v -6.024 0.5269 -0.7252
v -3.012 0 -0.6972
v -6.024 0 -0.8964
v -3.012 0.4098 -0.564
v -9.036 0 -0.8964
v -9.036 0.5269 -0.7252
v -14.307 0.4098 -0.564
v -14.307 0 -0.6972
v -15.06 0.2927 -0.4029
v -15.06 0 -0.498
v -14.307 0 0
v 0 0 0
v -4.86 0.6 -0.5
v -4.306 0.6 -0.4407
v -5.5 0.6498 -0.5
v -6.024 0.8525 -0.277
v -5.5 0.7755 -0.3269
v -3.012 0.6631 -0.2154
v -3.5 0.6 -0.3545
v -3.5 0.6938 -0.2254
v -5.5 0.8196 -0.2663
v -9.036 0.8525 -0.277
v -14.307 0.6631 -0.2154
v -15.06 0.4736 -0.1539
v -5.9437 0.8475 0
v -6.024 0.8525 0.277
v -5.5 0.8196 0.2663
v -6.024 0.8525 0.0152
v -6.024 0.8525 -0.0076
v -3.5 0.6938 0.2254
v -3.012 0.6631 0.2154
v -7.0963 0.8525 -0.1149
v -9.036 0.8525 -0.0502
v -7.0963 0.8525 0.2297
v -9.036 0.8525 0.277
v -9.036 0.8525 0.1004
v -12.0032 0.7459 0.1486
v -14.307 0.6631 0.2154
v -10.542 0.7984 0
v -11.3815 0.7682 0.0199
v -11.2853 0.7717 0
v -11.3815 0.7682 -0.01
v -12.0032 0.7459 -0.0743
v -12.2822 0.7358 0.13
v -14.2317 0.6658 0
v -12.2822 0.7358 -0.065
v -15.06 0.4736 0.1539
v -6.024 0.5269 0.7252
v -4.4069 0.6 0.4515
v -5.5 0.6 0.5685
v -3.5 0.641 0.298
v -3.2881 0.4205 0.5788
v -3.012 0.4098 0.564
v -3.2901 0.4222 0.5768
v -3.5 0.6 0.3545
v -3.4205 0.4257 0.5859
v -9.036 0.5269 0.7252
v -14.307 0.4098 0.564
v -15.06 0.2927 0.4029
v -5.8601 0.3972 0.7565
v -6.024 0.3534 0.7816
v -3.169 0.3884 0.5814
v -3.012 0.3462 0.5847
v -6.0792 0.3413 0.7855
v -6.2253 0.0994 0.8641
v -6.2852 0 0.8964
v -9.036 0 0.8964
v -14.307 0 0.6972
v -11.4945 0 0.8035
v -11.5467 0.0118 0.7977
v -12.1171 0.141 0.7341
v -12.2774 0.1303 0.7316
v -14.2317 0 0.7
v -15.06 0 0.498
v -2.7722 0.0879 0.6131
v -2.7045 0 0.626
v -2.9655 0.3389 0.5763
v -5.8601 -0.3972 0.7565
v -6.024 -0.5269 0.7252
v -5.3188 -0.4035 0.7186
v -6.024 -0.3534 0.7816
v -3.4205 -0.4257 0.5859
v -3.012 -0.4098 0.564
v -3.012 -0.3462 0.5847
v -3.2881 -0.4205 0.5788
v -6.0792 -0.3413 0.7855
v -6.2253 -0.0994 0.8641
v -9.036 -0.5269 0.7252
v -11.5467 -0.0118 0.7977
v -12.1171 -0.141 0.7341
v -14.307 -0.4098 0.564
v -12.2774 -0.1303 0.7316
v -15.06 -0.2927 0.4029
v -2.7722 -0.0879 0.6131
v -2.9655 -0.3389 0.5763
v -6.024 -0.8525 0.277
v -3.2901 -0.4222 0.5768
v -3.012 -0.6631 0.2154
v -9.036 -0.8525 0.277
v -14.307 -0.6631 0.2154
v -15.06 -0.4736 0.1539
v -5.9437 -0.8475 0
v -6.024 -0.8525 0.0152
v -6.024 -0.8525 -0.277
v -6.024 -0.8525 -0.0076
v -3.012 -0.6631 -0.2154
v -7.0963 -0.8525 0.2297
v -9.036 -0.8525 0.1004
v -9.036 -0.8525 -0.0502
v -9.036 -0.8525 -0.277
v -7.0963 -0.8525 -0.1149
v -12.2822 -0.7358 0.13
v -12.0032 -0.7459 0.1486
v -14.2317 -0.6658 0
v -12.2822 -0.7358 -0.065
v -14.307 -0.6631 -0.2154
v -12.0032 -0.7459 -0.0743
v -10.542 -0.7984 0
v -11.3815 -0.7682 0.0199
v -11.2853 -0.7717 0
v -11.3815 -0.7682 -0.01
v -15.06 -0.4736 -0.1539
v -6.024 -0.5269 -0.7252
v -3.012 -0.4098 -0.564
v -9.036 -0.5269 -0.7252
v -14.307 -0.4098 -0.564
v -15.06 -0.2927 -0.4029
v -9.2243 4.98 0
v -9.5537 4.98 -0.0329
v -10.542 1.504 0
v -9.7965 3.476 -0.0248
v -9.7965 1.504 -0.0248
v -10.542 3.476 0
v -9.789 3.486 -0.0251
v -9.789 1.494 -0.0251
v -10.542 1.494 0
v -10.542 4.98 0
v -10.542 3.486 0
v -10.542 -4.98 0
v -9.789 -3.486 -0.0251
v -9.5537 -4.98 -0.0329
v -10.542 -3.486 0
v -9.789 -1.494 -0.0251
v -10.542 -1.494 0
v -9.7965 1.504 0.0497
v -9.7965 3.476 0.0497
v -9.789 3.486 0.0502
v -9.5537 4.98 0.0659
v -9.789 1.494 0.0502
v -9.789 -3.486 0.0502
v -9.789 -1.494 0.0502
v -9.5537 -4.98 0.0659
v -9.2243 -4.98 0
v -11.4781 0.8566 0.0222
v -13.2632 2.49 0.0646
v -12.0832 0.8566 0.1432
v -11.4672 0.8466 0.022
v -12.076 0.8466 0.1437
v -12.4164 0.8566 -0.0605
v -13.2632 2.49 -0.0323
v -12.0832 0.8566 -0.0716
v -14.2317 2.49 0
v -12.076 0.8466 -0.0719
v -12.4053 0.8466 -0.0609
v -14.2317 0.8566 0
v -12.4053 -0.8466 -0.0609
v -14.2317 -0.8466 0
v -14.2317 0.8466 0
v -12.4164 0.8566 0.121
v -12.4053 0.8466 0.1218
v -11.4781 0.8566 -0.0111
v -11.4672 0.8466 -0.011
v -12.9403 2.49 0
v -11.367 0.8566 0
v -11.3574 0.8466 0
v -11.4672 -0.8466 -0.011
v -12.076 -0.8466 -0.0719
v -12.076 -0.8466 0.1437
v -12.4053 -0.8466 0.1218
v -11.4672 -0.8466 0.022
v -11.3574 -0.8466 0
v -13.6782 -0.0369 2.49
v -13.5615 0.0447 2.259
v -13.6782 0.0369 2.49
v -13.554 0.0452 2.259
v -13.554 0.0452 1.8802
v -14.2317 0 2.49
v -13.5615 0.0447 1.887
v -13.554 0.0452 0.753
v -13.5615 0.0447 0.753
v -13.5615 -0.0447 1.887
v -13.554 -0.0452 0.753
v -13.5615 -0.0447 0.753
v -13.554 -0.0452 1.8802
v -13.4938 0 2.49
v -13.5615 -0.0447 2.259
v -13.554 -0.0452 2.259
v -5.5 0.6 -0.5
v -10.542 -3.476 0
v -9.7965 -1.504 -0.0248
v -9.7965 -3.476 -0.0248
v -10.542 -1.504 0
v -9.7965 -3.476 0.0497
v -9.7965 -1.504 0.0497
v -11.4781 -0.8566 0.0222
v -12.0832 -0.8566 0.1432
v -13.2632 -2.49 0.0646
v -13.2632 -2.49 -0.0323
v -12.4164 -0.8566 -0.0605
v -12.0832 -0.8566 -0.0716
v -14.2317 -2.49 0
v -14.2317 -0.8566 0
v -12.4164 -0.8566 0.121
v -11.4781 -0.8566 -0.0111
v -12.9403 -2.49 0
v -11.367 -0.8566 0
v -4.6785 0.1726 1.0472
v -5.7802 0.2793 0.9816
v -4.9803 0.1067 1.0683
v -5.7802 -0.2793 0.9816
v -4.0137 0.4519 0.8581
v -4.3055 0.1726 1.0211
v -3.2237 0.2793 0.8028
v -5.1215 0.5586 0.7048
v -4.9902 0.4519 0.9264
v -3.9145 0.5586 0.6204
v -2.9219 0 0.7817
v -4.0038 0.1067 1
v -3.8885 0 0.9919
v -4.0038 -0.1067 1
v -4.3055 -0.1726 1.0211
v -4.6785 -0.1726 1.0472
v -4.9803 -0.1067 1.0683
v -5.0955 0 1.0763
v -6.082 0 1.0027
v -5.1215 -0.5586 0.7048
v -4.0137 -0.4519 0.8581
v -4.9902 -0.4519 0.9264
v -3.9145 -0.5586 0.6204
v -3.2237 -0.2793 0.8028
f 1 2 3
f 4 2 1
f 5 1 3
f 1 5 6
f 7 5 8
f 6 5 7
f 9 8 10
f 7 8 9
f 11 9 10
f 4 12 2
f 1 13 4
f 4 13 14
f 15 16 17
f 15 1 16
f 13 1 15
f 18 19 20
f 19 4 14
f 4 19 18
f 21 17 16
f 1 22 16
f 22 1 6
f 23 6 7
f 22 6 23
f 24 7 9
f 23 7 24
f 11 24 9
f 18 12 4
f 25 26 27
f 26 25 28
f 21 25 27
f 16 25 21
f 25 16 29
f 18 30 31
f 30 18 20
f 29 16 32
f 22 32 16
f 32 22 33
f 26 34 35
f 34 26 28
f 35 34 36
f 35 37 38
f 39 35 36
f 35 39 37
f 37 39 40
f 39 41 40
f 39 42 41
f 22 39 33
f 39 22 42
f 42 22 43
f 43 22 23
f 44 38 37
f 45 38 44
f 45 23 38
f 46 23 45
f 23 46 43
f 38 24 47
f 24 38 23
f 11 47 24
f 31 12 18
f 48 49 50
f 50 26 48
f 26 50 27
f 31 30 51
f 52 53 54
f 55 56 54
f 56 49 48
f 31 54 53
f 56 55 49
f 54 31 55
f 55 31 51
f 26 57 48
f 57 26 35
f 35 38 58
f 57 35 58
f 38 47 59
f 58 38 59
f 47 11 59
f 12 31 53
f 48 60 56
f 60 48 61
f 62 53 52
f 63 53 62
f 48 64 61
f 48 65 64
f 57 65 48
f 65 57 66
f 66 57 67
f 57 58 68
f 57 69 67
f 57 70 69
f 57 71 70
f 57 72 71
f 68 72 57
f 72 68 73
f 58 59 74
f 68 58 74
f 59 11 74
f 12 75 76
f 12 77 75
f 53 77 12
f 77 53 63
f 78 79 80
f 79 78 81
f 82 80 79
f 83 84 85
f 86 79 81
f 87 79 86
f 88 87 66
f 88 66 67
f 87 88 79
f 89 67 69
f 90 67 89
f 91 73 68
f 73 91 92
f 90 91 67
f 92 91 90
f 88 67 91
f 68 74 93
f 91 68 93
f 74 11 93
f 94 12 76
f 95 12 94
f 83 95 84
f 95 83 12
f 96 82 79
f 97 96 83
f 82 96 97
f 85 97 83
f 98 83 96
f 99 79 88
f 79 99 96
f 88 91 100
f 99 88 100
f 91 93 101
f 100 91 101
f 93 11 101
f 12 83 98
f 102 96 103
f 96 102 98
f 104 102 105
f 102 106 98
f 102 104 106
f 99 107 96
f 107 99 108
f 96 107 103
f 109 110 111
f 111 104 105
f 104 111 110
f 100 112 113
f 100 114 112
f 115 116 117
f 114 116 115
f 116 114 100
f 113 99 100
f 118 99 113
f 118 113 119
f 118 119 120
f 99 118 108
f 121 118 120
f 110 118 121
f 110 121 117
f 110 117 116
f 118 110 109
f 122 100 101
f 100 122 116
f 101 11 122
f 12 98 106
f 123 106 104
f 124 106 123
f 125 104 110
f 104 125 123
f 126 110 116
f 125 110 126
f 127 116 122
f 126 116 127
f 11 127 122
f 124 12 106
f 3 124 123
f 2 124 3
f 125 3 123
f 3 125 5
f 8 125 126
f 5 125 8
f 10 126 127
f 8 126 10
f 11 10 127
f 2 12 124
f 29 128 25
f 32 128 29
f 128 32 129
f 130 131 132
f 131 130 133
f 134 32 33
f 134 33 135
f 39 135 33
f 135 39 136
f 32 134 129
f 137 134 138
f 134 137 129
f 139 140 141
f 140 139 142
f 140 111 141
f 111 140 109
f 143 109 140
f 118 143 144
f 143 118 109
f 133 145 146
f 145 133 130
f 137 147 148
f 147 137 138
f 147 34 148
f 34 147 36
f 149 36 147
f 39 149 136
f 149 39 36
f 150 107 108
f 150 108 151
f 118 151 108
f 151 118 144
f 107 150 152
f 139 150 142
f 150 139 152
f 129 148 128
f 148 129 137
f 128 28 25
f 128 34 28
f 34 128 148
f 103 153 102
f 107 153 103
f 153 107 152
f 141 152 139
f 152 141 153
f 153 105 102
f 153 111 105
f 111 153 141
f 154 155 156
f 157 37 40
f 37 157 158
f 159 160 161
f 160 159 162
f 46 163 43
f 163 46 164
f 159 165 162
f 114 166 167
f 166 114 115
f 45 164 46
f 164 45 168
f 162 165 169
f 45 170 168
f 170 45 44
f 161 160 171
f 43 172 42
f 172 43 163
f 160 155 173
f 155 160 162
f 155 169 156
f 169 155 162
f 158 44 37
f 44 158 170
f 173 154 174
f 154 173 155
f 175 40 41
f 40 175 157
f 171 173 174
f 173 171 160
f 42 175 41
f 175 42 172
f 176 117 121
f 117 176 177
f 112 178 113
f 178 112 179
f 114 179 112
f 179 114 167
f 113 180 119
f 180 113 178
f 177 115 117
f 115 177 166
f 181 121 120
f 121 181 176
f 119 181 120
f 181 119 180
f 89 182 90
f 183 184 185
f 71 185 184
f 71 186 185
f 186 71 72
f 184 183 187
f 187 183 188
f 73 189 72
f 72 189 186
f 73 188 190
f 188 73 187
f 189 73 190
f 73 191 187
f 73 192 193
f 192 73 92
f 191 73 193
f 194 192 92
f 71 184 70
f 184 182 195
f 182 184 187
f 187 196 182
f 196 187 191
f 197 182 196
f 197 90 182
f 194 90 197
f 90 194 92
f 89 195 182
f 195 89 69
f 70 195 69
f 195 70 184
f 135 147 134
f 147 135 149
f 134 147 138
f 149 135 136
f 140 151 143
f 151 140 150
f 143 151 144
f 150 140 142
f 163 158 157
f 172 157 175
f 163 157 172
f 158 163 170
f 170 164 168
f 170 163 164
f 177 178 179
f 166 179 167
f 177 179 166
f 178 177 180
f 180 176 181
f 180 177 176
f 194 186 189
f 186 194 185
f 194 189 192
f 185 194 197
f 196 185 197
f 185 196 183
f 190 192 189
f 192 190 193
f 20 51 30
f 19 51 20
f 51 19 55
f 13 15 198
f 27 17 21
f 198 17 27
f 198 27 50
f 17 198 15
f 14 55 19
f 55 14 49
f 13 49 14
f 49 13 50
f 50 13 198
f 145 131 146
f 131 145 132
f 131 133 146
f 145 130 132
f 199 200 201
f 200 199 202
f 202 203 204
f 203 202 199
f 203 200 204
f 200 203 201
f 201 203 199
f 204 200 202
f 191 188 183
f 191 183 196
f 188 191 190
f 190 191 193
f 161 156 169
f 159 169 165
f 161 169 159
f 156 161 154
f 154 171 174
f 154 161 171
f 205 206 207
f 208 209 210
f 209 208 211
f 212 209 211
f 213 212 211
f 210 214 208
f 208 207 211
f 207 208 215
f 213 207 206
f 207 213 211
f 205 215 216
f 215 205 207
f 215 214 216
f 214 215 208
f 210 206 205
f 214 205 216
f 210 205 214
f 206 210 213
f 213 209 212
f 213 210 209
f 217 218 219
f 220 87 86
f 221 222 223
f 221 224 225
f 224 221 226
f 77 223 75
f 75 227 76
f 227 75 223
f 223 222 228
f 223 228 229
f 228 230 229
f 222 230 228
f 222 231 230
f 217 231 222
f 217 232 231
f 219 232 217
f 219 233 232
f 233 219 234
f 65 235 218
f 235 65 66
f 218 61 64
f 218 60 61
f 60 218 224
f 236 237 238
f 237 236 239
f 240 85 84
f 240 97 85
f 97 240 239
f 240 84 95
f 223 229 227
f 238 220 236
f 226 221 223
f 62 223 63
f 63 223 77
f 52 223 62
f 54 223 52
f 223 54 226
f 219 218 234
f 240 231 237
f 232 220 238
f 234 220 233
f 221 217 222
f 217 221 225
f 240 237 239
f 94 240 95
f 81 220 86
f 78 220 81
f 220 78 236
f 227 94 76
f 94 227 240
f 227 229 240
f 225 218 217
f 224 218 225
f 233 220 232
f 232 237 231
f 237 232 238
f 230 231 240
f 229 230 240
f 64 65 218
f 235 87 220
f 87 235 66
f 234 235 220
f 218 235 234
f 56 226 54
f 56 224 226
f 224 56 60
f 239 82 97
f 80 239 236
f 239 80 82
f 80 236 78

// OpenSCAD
$fn=10;
length = 15.06;
wingspan = 9.96;

chord = length*0.35;
taper = 0.25;

tail_span = wingspan*0.5;
tail_chord = chord*0.7;
tail_taper = 0.35;

vert_span = tail_span;
vert_chord = tail_chord;
vert_taper = 0.2;

module wing(chord, wingspan, taper) {
    color([0.6, 0.6, 0.6]) translate([-chord, 0]) rotate([90, 0, 180]) linear_extrude(height=wingspan/2, scale=taper) polygon([
        [0, 0],
        [-chord*0.75, 0.05*chord],
        [-chord, 0],
        [-chord*0.75, -0.025*chord]
    ]);
}

module wing_sym(chord, wingspan, taper) {
    color([0.6, 0.6, 0.6]) translate([-chord, 0]) rotate([90, 0, 180]) linear_extrude(height=wingspan/2, scale=taper) polygon([
        [0, 0],
        [-chord*0.75, 0.05*chord],
        [-chord, 0],
        [-chord*0.75, -0.05*chord]
    ]);
}

module airframe_half() {
    translate([-length*0.35, 0]) wing(chord, wingspan, taper);
    translate([-length*0.7, 0]) wing(tail_chord, tail_span, tail_taper);
    translate([-length*0.7, 0]) rotate([90, 0, 0]) 
        wing(vert_chord, vert_span, vert_taper);
}

module body() {
    color([0.6, 0.6, 0.6]) rotate([0, -90, 0]) rotate_extrude() polygon([
        [0,0],
        [0.07*wingspan,0.2*length],
        [0.09*wingspan,0.4*length],
        [0.09*wingspan,0.6*length],
        [0.07*wingspan,0.95*length],
        [0.05*wingspan,length],
        [0,0.95*length]
    ]);
}

module canopy() {
    color([0.6, 0.6, 0.8, 0.5]) translate([-0.3*length, 0, 0.044*length]) rotate([0, 4, 0]) scale([0.13*length, 0.039*length, 0.026*length]) difference() {
       sphere(1);
       translate([0, 0, -1.5]) cube([3, 3, 3], center=true);
    }
}

module airframe_no_cuts() {
    body();
    translate([-length*0.35, 0]) wing(chord, wingspan, taper);
    mirror([0, 1, 0]) translate([-length*0.35, 0]) wing(chord, wingspan, taper);
    translate([-length*0.7, 0]) wing(tail_chord, tail_span, tail_taper);
    mirror([0, 1, 0]) translate([-length*0.7, 0]) wing(tail_chord, tail_span, tail_taper);
    translate([-length*0.7, 0]) rotate([90, 0, 0]) 
        wing_sym(vert_chord, vert_span, vert_taper);
}

module aileron_cut(s) {
    translate([-0.7*length, wingspan/4, 0]) scale([s, s, 1]) cube([length*0.1, wingspan*0.2, length*0.1], center=true);
}

module elevator_cut(s) {
    translate([-0.9*length, tail_span*0.37, 0]) scale([s, s, 1]) cube([length*0.3, wingspan*0.2, length*0.1], center=true);
}

module rudder_cut(s) {
    translate([-length*0.95, 0, length*0.1]) scale([s, s, 1]) cube([length*0.1, wingspan*0.2, length*0.1], center=true);
}

module airframe() {
    difference() {
        airframe_no_cuts();
        aileron_cut(1);
        mirror([0, 1, 0]) aileron_cut(1);
        elevator_cut(1);
        mirror([0, 1, 0]) elevator_cut(1);
        rudder_cut();
        translate([-4.5, 1, 0.5]) cube([2, 0.8, 2], center=true); // cockpit
    }
}

module aileron() {
    color("red") render() intersection() {
        aileron_cut(0.99);
        airframe_no_cuts();
    }
}

module elevator() {
    color("red") render() intersection() {
        elevator_cut(0.99);
        airframe_no_cuts();
    }
}

module rudder() {
    color("red") render() intersection() {
        rudder_cut(0.99);
        airframe_no_cuts();
    }
}

module assembly() {
    airframe();
    aileron();
    mirror([0, 1, 0]) aileron();
    rudder();
    elevator();
    mirror([0, 1, 0]) elevator();
    canopy();
}

part = "assembly";

if (part == "airframe") {
    airframe();
} else if (part == "canopy") {
    canopy();
} else if (part == "left_aileron") {
    aileron();
} else if (part == "left_elevator") {
    elevator();
} else if (part == "right_aileron") {
    mirror([0, 1, 0]) aileron();
} else if (part == "right_elevator") {
    mirror([0, 1, 0]) elevator();
} else if (part == "rudder") {
    rudder();
} else {
    assembly();
}
